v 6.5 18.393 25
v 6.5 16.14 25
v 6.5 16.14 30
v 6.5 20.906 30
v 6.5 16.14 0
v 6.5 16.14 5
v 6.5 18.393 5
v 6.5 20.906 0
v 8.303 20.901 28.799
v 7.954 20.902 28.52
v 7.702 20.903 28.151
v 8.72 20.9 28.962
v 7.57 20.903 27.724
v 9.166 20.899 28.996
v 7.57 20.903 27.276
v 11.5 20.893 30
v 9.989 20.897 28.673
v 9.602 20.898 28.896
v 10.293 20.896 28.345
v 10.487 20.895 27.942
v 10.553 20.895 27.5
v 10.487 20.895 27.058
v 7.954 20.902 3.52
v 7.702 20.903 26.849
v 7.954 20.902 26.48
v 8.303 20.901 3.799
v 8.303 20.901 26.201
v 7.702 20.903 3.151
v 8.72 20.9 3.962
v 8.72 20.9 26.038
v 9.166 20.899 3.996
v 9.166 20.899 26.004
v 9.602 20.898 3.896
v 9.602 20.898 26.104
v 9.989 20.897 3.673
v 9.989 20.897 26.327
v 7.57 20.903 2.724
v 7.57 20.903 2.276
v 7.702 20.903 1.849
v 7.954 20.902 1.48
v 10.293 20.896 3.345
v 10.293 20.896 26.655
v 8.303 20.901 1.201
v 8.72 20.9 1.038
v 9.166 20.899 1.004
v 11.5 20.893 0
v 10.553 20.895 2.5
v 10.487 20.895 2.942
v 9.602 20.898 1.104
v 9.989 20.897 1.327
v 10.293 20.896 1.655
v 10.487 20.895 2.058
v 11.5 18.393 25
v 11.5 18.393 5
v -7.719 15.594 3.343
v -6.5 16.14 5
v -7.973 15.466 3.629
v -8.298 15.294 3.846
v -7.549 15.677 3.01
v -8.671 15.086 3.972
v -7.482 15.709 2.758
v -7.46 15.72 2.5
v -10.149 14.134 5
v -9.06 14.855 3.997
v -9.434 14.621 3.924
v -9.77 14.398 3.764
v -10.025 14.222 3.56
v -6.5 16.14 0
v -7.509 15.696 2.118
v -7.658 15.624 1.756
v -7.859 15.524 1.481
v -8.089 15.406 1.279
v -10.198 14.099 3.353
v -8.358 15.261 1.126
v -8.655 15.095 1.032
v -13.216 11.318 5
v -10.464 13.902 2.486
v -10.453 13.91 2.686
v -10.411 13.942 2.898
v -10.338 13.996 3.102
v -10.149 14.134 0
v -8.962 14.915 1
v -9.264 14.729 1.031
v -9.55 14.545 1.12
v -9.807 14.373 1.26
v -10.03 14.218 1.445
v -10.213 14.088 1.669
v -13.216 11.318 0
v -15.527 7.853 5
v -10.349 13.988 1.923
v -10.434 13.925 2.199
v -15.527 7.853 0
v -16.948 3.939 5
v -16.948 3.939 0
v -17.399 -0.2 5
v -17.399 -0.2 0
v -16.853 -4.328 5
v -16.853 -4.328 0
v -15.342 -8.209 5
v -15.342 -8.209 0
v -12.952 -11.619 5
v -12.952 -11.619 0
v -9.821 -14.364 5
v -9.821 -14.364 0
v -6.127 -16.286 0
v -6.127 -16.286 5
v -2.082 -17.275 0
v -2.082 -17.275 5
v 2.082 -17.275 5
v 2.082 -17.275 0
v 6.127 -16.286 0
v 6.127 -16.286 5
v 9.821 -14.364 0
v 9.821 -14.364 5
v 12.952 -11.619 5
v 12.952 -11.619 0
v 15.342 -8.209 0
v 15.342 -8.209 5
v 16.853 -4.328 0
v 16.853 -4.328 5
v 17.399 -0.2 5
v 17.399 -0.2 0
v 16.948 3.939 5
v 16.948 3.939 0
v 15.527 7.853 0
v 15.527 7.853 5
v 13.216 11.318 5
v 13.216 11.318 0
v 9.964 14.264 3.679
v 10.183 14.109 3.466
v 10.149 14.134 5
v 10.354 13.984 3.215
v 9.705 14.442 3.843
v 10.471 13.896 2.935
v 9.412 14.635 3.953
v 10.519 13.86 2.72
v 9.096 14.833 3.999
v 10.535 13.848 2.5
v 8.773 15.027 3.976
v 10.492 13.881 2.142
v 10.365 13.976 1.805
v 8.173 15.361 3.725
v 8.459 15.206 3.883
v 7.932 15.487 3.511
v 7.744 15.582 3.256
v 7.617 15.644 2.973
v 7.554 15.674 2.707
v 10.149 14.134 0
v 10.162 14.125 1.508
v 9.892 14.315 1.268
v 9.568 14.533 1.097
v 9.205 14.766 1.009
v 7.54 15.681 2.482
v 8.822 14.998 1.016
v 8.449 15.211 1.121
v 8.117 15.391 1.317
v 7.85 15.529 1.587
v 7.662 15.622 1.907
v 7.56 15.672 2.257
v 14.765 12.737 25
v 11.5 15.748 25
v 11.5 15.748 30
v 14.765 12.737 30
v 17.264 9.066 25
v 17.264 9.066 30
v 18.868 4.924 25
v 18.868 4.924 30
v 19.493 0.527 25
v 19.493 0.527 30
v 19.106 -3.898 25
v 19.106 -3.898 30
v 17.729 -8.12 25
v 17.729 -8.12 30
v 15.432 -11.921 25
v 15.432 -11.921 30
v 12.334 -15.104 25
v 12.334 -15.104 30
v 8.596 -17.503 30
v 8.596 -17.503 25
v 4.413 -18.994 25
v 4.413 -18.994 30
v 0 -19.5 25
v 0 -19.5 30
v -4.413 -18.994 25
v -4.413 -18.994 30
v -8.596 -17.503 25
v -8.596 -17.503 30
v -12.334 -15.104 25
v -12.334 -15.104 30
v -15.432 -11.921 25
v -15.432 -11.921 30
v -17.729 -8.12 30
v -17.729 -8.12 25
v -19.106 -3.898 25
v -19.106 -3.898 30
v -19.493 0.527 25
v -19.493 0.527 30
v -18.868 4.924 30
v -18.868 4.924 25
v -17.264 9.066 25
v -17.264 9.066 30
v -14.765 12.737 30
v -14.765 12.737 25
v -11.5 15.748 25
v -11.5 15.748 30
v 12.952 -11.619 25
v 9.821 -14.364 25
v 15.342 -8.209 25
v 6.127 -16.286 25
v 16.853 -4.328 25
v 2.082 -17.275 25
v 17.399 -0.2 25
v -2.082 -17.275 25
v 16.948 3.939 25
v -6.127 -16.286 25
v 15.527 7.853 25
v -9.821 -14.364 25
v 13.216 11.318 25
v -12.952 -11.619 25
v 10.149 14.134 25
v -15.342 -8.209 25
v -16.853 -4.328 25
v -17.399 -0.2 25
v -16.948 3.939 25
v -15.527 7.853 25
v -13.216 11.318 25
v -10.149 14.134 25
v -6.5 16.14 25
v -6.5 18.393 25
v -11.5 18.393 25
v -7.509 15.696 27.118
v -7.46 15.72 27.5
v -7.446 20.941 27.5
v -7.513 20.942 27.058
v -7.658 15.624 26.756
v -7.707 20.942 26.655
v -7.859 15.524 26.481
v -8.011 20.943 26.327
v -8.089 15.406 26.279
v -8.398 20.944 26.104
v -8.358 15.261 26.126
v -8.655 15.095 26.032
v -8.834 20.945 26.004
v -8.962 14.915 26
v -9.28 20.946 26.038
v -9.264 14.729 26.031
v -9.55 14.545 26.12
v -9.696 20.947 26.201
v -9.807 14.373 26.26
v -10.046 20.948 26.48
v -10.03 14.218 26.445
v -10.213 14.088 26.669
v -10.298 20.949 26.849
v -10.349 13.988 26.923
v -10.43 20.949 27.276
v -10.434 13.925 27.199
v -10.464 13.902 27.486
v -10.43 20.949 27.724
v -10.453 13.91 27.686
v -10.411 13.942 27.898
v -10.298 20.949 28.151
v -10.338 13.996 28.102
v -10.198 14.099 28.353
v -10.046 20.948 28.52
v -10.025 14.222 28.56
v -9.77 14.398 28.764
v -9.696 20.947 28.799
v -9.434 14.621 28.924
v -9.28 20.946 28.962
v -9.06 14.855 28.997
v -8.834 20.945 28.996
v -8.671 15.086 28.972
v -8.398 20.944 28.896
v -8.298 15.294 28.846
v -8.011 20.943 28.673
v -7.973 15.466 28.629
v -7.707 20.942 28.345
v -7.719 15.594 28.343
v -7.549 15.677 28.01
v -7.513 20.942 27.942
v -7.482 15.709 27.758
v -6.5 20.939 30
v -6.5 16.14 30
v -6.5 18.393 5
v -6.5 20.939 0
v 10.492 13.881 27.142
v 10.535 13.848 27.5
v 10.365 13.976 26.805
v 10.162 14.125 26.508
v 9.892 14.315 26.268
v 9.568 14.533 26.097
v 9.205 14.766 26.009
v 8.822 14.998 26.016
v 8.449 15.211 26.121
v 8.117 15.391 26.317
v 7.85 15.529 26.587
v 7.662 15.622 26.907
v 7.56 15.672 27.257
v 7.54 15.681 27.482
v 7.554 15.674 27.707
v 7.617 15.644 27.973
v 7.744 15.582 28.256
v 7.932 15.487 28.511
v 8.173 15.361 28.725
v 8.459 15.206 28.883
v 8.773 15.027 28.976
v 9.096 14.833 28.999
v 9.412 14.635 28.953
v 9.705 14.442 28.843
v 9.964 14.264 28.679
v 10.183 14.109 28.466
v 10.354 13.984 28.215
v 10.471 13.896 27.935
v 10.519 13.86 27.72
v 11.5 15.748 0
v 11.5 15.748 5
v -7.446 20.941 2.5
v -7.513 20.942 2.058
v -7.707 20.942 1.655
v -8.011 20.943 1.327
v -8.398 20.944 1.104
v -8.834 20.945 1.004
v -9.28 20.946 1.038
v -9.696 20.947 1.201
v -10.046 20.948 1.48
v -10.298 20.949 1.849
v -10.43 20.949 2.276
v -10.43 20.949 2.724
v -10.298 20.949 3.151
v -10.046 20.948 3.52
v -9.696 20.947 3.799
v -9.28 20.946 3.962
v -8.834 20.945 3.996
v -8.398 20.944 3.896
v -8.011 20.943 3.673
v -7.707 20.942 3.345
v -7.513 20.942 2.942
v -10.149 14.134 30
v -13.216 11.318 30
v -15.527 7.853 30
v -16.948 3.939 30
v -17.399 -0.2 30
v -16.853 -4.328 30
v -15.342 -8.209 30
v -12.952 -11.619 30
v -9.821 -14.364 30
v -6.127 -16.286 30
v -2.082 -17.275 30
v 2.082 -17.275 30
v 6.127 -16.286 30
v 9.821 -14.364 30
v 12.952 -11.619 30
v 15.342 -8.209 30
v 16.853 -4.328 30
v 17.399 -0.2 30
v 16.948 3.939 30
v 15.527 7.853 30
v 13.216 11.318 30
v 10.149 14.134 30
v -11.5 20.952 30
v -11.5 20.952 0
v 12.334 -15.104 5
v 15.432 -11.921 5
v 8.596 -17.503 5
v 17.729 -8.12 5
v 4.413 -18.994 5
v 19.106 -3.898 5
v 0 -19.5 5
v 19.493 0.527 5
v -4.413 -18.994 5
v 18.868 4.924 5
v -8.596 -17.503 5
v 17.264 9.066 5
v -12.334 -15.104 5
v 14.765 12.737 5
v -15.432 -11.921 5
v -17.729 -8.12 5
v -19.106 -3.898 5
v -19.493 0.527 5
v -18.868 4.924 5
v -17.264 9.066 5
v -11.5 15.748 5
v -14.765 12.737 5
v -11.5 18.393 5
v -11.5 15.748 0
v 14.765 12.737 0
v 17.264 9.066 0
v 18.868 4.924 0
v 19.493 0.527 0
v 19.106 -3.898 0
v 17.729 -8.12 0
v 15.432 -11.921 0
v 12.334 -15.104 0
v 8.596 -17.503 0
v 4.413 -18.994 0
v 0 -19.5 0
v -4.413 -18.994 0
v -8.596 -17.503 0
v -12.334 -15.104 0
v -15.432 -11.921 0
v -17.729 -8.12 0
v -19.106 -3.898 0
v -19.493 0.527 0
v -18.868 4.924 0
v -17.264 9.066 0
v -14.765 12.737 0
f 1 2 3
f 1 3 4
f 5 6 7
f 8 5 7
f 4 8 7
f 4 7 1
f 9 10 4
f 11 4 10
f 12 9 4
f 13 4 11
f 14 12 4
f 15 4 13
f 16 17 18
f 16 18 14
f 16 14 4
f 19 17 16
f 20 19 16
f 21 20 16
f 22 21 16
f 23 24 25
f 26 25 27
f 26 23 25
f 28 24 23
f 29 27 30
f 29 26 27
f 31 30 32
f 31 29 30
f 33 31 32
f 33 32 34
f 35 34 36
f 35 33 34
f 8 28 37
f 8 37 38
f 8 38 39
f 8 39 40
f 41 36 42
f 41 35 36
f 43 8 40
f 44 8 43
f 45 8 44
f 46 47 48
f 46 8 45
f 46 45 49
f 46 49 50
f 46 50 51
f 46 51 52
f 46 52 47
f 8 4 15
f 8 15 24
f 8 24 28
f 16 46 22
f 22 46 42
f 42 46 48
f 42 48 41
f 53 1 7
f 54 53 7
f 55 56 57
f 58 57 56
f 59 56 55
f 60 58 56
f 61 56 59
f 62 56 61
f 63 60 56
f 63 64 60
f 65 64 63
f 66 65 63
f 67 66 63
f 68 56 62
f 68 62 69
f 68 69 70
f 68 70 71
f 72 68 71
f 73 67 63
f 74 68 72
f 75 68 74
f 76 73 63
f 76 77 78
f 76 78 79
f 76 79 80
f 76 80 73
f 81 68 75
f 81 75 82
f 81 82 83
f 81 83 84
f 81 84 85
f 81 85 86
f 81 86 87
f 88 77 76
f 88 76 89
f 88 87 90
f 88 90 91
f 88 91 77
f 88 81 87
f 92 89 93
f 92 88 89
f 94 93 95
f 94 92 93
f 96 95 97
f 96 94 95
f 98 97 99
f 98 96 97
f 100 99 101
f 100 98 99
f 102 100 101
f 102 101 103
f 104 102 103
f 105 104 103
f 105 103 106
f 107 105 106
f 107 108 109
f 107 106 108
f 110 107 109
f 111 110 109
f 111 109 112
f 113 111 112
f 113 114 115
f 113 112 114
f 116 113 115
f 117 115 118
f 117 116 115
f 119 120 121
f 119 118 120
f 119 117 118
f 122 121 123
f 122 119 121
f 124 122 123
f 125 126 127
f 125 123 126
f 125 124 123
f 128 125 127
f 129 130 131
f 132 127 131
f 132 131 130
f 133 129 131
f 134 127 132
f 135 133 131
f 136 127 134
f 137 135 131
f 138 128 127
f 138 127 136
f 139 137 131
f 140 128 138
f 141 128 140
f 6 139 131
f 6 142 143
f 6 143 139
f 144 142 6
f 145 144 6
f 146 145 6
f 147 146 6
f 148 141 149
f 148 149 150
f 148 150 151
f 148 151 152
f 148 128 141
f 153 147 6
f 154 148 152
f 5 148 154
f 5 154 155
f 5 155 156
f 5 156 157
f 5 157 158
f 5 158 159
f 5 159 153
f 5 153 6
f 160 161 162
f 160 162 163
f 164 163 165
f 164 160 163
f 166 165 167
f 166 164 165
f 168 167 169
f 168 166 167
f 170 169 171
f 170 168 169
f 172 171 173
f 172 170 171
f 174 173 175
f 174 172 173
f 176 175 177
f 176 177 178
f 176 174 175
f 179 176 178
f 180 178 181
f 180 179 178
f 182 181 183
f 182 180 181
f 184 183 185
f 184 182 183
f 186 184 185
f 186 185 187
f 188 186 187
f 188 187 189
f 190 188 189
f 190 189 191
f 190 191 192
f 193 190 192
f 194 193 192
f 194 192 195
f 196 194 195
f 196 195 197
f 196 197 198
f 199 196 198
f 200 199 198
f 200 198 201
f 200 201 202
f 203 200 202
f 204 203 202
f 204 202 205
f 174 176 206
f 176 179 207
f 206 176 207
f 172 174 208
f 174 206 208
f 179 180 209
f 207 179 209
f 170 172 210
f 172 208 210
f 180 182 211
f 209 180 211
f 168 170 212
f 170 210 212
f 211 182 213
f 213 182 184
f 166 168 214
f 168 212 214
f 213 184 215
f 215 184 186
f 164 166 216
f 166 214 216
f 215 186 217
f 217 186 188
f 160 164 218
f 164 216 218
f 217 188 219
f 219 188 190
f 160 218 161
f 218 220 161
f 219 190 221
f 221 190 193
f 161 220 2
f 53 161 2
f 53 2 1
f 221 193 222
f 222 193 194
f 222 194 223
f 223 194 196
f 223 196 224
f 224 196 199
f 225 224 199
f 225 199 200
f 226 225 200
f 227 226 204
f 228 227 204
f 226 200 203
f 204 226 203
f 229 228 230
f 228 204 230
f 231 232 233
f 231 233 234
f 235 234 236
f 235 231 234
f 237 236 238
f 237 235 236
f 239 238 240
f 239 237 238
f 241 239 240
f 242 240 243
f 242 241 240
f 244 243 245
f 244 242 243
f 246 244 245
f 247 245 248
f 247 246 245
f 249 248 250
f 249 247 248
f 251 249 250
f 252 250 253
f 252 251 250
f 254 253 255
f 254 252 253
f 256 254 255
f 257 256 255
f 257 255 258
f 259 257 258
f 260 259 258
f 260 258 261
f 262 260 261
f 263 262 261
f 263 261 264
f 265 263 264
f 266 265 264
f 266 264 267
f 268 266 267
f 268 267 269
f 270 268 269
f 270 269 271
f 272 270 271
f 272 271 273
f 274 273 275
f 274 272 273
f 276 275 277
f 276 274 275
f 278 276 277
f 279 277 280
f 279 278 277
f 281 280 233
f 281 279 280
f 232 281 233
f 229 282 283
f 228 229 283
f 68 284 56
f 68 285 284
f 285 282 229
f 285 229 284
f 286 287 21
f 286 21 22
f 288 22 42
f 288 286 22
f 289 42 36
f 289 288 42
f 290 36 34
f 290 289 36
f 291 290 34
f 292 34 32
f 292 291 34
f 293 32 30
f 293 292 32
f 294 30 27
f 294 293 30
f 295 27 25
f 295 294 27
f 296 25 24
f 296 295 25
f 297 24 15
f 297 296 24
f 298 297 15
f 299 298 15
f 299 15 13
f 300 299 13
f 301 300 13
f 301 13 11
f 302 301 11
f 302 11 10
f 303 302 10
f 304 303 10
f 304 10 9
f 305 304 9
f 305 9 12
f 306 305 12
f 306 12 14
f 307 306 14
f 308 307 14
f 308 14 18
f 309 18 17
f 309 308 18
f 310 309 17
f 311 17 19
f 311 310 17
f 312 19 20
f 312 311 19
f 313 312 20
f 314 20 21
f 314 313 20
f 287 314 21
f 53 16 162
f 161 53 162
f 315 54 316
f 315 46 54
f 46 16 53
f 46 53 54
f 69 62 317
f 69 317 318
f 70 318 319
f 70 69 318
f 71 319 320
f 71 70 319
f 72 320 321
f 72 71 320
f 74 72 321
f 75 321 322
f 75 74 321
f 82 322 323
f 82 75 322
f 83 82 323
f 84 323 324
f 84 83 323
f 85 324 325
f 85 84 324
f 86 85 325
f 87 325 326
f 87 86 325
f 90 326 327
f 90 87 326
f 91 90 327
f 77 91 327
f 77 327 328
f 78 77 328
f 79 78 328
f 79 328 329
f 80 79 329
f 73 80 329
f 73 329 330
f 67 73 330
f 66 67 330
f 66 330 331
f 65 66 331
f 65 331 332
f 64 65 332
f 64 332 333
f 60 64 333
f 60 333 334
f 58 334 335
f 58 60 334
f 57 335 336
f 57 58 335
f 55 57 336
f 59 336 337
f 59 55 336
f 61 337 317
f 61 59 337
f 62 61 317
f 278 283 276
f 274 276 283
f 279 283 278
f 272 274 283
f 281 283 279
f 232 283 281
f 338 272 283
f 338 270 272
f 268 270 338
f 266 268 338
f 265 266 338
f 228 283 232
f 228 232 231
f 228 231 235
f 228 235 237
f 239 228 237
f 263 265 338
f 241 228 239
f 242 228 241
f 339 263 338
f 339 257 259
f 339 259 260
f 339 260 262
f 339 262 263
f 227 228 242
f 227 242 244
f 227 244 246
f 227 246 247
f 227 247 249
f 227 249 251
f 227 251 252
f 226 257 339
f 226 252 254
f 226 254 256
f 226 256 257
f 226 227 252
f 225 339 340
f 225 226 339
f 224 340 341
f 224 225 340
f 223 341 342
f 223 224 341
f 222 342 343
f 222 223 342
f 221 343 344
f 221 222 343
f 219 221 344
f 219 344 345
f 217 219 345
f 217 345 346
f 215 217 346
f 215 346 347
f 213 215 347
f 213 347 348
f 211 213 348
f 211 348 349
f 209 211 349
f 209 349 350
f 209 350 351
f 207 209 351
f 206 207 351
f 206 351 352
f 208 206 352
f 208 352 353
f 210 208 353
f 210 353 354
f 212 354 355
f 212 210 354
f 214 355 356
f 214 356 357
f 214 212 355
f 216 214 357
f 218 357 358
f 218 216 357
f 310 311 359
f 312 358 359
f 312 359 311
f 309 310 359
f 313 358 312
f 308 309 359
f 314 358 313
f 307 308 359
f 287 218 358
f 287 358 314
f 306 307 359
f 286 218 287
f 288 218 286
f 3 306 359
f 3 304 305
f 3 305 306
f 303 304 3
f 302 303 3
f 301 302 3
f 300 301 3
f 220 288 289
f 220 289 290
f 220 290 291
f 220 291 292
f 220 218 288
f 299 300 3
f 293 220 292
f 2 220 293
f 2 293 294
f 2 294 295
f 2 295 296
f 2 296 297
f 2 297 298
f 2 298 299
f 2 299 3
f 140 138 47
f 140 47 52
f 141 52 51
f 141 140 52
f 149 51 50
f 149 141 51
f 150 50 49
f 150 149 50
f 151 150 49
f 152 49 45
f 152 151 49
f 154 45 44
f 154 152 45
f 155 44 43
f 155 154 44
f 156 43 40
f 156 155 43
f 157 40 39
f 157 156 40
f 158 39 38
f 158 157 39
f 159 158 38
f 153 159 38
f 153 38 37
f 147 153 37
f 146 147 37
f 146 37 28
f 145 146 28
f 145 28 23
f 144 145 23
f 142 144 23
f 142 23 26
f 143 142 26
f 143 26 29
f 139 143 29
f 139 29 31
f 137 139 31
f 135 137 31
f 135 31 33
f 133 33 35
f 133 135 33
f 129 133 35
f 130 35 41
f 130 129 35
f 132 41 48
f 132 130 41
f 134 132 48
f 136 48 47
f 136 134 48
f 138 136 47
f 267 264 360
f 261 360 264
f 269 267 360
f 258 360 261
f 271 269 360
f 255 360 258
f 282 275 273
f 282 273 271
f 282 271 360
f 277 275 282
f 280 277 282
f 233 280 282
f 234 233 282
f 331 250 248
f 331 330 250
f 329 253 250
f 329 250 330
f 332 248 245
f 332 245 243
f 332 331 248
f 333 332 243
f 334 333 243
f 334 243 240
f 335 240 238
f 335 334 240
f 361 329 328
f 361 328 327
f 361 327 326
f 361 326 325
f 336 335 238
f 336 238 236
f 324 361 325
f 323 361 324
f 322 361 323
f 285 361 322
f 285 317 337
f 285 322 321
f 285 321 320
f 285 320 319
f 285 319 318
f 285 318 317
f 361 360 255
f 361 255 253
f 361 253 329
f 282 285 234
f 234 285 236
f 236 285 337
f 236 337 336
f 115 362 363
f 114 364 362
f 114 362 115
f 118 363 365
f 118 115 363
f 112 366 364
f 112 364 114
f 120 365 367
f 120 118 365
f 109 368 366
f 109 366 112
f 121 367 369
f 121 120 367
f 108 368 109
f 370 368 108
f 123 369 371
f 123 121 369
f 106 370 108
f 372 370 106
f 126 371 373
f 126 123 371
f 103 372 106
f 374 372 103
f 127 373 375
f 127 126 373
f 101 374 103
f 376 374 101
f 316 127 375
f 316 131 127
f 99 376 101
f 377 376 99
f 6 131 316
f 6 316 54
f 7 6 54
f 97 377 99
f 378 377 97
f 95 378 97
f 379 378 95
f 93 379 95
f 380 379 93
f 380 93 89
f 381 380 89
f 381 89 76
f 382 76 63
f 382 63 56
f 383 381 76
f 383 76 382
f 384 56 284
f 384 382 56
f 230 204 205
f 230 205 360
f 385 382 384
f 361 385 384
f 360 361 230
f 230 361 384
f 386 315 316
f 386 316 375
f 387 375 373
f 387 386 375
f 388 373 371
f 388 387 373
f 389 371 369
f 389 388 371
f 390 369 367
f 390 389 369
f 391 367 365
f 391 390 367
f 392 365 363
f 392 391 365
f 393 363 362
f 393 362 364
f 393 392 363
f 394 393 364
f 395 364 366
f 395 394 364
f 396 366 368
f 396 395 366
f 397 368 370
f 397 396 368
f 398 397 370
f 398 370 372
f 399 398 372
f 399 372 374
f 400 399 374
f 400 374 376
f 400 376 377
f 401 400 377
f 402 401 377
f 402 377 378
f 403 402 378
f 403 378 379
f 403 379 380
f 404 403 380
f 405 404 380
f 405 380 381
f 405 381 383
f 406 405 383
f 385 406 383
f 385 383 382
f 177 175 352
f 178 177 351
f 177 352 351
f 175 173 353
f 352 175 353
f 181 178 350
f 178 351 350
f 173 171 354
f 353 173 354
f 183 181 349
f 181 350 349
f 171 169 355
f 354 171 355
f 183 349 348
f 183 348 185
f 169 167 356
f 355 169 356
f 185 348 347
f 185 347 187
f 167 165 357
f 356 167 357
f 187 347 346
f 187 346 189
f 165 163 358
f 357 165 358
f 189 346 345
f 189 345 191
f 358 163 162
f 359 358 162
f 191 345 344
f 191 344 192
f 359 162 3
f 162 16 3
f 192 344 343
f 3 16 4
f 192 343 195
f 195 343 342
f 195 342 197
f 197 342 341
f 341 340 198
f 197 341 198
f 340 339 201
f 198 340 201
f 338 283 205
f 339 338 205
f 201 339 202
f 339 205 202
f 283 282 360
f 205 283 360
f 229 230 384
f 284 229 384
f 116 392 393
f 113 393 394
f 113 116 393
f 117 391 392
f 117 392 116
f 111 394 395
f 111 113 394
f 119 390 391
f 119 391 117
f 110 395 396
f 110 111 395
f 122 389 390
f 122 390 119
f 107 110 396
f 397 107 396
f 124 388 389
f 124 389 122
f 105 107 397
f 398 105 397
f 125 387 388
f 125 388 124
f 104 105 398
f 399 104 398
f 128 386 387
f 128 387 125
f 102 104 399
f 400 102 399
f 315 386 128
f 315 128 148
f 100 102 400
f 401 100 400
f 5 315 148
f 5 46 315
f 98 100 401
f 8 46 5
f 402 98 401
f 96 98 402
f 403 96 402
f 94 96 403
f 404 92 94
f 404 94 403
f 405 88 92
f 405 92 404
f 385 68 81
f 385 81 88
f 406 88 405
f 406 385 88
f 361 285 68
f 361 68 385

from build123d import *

# Parameters (mm, degrees)
SALIENTE_EXTRUIR1_DEPTH    = 30
CORTAR_EXTRUIR2_DEPTH      = 42.46352267
CORTAR_EXTRUIR2_DEPTH_BACK = 42.46352267
CROQUIS3_W                 = 20
CROQUIS3_H                 = 40.792863267
CORTAR_EXTRUIR3_DEPTH      = 55.00268459
CORTAR_EXTRUIR3_DEPTH_BACK = 10
CROQUIS4_R                 = 1.5


with BuildPart() as part:
    # Croquis1 → Saliente-Extruir1 (new body)
    with BuildSketch(Plane.XY):
        with BuildLine():
            Line((-6.5, 20.93890902), (-6.5, 16.140322178))
            ThreePointArc((-6.5, 16.140322178), (0, -17.4), (6.5, 16.140322178))
            Line((6.5, 16.140322178), (6.5, 20.905653754))
            Line((6.5, 20.905653754), (11.5, 20.892863267))
            Line((11.5, 20.892863267), (11.5, 15.748015748))
            ThreePointArc((11.5, 15.748015748), (0, -19.5), (-11.5, 15.748015748))
            Line((-11.5, 15.748015748), (-11.5, 20.951699507))
            Line((-11.5, 20.951699507), (-6.5, 20.93890902))
        make_face()
    extrude(amount=SALIENTE_EXTRUIR1_DEPTH)

    # Croquis3 → Cortar-Extruir2 (cut, two sides: drawn at the far end of the back side and taken through both)
    with BuildSketch(Plane(origin=(0, 0, 0), x_dir=(0, 0, -1), z_dir=(1, 0, 0)).offset(-CORTAR_EXTRUIR2_DEPTH_BACK)):
        with Locations((-15, -2.003568366)):
            Rectangle(CROQUIS3_W, CROQUIS3_H)
    extrude(amount=CORTAR_EXTRUIR2_DEPTH + CORTAR_EXTRUIR2_DEPTH_BACK, mode=Mode.SUBTRACT)

    # Croquis4 → Cortar-Extruir3 (cut, two sides: drawn at the far end of the back side and taken through both)
    with BuildSketch(Plane(origin=(0.053520884, 20.922144475, 0), x_dir=(0.9999967280848749, -0.0025580890416273647, 0), z_dir=(0.0025580890416273647, 0.9999967280848749, 0)).offset(-CORTAR_EXTRUIR3_DEPTH_BACK)):
        with Locations((9, -2.5)):
            Circle(CROQUIS4_R)
        with Locations((-9, -2.5)):
            Circle(CROQUIS4_R)
        with Locations((-9, -27.5)):
            Circle(CROQUIS4_R)
        with Locations((9, -27.5)):
            Circle(CROQUIS4_R)
    extrude(amount=CORTAR_EXTRUIR3_DEPTH + CORTAR_EXTRUIR3_DEPTH_BACK, mode=Mode.SUBTRACT)


solid = part.part
